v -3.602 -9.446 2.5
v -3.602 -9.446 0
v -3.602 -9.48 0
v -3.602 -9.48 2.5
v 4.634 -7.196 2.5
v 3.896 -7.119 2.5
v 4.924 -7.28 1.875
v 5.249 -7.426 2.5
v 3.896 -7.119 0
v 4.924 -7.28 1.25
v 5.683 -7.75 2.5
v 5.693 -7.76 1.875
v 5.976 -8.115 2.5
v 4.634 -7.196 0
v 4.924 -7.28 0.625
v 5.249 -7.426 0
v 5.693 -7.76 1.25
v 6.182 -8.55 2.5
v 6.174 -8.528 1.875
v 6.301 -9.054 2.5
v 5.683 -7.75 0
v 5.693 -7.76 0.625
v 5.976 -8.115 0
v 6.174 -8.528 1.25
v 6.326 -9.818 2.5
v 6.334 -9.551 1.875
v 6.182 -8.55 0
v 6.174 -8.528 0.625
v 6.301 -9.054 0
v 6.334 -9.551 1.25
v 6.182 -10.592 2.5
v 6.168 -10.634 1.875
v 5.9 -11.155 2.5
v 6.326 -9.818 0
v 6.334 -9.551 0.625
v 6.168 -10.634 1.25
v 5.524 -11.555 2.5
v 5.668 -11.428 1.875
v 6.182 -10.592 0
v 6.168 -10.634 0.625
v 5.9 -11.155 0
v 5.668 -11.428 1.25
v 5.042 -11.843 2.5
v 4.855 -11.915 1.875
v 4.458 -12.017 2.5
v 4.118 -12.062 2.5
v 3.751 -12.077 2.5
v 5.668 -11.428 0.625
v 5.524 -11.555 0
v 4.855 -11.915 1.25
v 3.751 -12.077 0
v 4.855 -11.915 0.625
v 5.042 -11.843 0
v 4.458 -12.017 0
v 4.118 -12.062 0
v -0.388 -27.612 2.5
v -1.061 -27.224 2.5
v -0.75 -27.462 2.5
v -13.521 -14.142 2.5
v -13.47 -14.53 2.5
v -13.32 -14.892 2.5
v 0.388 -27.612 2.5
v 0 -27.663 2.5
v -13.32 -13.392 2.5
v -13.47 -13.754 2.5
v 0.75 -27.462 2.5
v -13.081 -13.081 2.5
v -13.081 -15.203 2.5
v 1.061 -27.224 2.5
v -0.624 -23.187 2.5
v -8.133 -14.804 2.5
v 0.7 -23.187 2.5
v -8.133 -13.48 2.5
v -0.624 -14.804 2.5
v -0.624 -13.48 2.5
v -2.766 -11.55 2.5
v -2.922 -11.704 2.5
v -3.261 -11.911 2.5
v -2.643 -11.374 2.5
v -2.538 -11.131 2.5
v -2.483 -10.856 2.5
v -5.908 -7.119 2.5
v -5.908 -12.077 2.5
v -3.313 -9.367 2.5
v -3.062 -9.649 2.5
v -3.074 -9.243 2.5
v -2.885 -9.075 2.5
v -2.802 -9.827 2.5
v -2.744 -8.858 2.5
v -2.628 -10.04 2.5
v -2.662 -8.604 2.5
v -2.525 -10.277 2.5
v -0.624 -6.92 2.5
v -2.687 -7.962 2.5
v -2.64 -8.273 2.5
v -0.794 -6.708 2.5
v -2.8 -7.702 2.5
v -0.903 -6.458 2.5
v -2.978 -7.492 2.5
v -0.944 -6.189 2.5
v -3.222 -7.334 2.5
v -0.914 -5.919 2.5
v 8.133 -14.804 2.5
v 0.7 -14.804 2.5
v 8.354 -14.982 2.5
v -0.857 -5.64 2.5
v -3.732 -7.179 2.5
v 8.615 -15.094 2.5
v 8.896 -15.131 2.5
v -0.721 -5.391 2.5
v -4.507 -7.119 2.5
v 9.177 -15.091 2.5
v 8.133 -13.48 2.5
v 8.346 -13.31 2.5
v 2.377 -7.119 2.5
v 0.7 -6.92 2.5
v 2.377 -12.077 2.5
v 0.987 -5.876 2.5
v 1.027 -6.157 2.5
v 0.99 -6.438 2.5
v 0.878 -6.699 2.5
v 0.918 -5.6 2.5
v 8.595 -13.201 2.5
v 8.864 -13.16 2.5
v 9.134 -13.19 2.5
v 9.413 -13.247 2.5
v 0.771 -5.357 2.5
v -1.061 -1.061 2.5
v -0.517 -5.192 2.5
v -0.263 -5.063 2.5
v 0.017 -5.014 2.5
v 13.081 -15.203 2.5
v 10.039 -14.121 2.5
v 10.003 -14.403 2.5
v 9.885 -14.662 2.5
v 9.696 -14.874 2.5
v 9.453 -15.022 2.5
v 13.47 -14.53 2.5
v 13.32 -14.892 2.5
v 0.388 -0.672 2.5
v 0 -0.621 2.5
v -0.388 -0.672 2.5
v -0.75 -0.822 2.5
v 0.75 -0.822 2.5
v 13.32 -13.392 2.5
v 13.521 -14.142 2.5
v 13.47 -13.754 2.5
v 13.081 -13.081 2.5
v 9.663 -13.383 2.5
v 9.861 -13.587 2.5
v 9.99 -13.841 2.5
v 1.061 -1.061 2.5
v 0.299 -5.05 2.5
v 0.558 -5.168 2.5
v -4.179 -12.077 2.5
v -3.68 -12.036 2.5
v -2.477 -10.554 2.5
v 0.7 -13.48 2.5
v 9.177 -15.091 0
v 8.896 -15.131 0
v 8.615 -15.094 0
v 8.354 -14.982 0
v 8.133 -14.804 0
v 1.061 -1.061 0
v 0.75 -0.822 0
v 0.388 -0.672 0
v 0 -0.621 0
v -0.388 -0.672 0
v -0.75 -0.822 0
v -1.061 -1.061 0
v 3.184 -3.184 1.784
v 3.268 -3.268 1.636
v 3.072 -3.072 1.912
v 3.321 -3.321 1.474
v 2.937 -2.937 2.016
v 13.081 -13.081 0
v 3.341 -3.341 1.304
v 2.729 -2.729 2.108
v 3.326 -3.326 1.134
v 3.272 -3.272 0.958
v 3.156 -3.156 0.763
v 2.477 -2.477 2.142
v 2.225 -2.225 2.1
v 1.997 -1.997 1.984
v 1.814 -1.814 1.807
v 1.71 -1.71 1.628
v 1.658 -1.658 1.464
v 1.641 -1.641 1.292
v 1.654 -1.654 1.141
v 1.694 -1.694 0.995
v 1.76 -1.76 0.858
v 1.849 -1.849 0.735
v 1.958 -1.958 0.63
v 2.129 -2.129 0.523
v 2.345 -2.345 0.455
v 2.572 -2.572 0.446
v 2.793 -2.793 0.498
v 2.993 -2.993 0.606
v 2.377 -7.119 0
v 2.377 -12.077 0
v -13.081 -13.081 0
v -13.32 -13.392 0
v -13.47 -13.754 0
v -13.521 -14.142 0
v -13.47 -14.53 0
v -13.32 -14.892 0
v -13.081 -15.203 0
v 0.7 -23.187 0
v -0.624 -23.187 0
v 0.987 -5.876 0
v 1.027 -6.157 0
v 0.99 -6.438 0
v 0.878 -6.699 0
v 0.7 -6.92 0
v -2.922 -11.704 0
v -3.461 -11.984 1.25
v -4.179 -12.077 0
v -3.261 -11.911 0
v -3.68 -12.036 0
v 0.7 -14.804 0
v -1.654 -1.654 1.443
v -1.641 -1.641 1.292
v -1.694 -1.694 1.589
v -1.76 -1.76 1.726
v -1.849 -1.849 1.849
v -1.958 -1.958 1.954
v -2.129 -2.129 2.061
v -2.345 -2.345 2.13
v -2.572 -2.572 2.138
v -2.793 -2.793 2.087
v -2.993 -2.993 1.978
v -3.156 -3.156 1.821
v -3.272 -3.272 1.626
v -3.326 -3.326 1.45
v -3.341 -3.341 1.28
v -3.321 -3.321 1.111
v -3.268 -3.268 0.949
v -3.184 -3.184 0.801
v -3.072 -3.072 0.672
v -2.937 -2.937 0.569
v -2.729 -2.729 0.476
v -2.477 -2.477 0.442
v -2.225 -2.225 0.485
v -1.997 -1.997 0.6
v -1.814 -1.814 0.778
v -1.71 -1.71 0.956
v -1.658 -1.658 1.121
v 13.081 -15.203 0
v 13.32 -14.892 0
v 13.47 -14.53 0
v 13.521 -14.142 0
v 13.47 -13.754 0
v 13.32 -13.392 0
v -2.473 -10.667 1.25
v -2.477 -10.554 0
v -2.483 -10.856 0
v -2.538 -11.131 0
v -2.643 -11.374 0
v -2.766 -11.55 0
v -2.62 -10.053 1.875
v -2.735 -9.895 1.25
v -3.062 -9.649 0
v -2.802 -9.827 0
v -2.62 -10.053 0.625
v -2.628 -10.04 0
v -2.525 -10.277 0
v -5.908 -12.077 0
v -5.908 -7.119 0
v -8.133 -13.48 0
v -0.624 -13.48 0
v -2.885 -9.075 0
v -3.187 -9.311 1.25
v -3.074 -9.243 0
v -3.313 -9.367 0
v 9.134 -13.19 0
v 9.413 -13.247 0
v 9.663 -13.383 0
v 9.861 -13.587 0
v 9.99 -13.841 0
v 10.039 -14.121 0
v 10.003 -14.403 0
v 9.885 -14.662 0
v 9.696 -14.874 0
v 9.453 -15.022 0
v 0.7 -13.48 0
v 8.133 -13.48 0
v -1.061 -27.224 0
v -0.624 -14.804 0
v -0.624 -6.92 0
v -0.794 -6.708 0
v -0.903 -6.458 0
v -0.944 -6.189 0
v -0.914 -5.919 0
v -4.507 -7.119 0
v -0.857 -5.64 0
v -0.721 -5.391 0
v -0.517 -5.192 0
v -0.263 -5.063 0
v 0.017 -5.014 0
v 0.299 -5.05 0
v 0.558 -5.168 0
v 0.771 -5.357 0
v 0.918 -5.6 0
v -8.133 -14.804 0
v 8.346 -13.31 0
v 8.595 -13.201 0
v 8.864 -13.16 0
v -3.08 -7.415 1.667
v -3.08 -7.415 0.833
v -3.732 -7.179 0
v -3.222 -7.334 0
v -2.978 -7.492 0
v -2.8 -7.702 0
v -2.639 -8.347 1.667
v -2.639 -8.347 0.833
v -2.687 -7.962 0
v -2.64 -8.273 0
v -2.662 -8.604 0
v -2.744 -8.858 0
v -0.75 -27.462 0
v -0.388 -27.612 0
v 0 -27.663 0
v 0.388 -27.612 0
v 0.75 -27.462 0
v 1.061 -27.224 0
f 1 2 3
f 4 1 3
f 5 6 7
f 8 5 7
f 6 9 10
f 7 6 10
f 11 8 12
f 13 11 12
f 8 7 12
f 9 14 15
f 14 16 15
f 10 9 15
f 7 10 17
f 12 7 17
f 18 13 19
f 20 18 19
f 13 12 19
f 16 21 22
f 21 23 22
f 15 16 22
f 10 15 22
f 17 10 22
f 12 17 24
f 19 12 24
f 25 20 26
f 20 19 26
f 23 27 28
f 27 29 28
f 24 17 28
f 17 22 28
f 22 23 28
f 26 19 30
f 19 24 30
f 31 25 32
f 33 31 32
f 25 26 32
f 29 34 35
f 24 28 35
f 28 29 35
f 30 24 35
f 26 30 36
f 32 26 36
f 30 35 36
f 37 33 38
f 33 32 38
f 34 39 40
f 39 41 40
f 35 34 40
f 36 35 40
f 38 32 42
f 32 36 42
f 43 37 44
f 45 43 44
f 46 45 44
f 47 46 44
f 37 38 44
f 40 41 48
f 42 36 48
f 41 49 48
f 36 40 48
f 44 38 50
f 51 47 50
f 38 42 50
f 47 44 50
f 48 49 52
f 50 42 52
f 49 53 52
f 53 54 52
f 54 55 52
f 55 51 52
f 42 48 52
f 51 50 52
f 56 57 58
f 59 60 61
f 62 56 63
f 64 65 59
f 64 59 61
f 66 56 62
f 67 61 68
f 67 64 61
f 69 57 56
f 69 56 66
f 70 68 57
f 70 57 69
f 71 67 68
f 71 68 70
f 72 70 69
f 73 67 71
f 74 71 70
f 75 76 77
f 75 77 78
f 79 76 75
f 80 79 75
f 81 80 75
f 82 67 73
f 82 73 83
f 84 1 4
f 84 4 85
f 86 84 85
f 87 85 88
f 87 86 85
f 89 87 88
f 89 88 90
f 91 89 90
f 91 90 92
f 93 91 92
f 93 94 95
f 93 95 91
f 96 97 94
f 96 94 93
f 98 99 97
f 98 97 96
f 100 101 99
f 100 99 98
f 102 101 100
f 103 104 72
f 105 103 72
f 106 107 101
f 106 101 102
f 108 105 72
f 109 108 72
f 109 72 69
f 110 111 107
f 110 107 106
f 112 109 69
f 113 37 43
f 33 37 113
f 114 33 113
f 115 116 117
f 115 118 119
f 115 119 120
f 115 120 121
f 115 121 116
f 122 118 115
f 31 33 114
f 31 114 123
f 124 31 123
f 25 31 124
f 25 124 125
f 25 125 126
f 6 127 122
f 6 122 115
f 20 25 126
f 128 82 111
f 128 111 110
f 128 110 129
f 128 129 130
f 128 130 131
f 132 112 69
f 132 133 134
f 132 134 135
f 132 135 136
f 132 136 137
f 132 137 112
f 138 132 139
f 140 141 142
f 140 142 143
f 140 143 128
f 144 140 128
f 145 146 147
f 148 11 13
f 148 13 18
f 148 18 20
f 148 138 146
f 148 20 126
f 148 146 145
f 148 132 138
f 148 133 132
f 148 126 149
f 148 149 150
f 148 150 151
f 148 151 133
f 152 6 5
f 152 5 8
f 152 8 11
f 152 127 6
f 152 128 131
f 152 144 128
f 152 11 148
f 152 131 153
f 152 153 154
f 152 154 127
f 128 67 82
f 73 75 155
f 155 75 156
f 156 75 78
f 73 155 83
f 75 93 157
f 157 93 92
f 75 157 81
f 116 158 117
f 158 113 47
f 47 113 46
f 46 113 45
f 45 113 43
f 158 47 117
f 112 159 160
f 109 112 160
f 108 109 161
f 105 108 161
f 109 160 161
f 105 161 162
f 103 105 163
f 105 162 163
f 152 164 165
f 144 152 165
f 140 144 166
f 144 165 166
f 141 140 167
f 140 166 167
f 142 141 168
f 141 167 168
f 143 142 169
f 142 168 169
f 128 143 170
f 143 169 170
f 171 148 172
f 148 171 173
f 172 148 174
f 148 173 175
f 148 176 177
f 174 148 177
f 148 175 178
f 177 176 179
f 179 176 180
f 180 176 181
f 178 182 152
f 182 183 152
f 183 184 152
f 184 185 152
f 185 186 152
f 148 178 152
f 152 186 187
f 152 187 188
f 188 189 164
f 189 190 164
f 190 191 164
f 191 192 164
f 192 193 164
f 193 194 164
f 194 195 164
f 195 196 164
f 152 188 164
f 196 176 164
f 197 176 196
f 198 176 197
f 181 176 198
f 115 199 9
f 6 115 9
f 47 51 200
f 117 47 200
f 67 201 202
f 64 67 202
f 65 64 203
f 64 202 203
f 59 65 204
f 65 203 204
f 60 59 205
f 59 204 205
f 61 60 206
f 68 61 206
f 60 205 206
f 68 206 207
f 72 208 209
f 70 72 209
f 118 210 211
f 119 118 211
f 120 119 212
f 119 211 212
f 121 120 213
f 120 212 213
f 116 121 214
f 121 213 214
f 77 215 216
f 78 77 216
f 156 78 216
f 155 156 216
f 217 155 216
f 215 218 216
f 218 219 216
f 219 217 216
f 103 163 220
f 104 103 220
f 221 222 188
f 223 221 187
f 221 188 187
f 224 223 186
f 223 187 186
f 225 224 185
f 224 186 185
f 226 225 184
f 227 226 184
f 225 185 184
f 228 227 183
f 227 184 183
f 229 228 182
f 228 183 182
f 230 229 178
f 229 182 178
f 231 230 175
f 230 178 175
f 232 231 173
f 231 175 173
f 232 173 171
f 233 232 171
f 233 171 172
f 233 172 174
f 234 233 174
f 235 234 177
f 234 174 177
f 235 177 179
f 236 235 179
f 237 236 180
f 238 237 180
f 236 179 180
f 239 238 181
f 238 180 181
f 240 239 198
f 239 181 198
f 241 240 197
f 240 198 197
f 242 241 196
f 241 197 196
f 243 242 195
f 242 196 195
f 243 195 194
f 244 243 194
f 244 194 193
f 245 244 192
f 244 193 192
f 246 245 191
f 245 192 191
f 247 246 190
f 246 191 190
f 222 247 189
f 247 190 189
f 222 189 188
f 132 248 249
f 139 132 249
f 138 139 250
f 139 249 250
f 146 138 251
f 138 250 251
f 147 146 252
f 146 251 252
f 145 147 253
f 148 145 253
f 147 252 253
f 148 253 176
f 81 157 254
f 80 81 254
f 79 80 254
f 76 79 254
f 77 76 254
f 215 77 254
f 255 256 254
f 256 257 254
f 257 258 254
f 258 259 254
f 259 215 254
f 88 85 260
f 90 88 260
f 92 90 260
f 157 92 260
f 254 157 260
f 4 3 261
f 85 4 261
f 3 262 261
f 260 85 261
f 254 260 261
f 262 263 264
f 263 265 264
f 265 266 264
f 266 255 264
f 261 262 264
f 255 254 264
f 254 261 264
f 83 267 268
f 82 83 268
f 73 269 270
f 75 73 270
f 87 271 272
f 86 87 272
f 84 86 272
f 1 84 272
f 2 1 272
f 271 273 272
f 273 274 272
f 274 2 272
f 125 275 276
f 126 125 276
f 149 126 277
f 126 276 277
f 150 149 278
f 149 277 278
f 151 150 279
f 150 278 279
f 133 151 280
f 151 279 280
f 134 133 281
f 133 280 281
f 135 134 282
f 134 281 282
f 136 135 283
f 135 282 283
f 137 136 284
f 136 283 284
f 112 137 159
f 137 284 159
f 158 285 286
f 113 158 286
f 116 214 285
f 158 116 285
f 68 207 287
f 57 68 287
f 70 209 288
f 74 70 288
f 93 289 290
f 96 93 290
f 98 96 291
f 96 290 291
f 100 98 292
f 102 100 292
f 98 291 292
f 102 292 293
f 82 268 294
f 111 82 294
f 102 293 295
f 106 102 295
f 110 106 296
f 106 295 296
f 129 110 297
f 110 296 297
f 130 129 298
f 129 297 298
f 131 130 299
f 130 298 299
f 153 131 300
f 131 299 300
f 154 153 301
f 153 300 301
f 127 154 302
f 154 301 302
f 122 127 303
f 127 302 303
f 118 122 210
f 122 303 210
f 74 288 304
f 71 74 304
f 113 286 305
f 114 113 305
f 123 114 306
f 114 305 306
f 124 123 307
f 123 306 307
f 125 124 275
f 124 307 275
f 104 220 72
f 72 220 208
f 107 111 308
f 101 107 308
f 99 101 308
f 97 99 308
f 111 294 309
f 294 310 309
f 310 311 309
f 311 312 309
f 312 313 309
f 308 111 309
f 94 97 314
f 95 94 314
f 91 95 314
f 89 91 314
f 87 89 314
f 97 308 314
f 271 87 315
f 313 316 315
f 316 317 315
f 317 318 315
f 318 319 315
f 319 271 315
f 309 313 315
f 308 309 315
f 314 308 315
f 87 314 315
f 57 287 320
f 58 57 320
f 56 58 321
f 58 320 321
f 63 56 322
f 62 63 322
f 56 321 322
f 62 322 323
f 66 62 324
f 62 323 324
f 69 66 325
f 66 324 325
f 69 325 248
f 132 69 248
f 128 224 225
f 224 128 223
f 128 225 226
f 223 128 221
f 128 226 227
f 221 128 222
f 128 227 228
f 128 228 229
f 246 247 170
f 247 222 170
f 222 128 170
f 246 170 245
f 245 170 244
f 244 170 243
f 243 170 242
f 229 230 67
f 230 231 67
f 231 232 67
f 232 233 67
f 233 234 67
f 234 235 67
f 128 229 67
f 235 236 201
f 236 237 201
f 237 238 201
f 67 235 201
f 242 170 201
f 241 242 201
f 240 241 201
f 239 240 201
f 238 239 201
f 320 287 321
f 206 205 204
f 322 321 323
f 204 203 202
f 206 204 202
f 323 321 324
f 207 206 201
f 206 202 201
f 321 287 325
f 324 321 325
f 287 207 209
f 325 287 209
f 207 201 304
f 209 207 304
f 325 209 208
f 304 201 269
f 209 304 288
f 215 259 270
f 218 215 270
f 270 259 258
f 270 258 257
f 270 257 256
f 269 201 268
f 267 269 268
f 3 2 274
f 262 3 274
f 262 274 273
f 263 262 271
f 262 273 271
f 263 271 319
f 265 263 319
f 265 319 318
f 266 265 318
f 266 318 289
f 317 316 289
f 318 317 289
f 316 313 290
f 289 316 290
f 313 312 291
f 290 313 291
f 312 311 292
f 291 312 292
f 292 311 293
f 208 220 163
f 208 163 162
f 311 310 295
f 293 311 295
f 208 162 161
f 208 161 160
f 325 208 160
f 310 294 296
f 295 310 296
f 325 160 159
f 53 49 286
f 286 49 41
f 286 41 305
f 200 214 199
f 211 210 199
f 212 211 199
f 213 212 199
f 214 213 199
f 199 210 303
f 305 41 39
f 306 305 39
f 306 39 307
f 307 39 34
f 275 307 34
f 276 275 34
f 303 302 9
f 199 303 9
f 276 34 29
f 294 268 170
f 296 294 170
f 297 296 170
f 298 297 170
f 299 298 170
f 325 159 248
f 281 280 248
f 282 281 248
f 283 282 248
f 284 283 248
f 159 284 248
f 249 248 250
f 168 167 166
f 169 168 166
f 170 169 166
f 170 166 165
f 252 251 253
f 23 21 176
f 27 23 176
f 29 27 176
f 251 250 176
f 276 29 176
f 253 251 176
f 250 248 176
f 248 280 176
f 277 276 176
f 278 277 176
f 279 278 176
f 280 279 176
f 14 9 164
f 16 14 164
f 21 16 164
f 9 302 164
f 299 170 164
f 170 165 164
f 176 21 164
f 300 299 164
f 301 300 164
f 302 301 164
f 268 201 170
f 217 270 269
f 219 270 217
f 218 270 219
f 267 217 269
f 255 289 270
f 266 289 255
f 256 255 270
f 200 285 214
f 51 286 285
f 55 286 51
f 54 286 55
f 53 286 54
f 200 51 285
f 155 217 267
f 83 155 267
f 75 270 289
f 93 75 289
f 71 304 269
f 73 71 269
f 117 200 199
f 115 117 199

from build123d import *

# Parameters (mm, degrees)
F1_DEPTH = 2.5
F2_R     = 0.85
F3_DEPTH = 12.5


with BuildPart() as f1:
    # F0 (on Top) → F1 (new body)
    with BuildSketch(Plane.XY):
        with BuildLine():
            Line((13.081475452, -13.081475452), (1.0606601718, -1.0606601718))
            ThreePointArc((1.0606601718, -1.0606601718), (0, -0.6213203436), (-1.0606601718, -1.0606601718))
            Line((-1.0606601718, -1.0606601718), (-13.081475452, -13.081475452))
            ThreePointArc((-13.081475452, -13.081475452), (-13.5208152802, -14.1421356237), (-13.081475452, -15.2027957955))
            Line((-13.081475452, -15.2027957955), (-1.0606601718, -27.2236110757))
            ThreePointArc((-1.0606601718, -27.2236110757), (0, -27.6629509039), (1.0606601718, -27.2236110757))
            Line((1.0606601718, -27.2236110757), (13.081475452, -15.2027957955))
            ThreePointArc((13.081475452, -15.2027957955), (13.5208152802, -14.1421356237), (13.081475452, -13.081475452))
        make_face()
        with BuildLine():
            Line((-5.9082568333, -12.0771760074), (-5.9082568333, -7.1194937158))
            Line((-5.9082568333, -7.1194937158), (-4.5074321806, -7.1194937158))
            add(Edge.make_bspline(
                [(-4.5074321806, -7.1194937158), (-3.5211040556, -7.1194937158), (-3.0800233264, -7.4146326047)],
                knots=[0, 0, 0, 1, 1, 1], degree=2))
            add(Edge.make_bspline(
                [(-3.0800233264, -7.4146326047), (-2.6389425972, -7.7097714936), (-2.6389425972, -8.3467072574)],
                knots=[0, 0, 0, 1, 1, 1], degree=2))
            add(Edge.make_bspline(
                [(-2.6389425972, -8.3467072574), (-2.6389425972, -8.7883305213), (-2.8847108264, -9.0747888547)],
                knots=[0, 0, 0, 1, 1, 1], degree=2))
            add(Edge.make_bspline(
                [(-2.8847108264, -9.0747888547), (-3.1304790556, -9.361247188), (-3.6024842639, -9.4458826047)],
                knots=[0, 0, 0, 1, 1, 1], degree=2))
            Line((-3.6024842639, -9.4458826047), (-3.6024842639, -9.4795197574))
            add(Edge.make_bspline(
                [(-3.6024842639, -9.4795197574), (-2.4729269722, -9.6726621186), (-2.4729269722, -10.6665857297)],
                knots=[0, 0, 0, 1, 1, 1], degree=2))
            add(Edge.make_bspline(
                [(-2.4729269722, -10.6665857297), (-2.4729269722, -11.3306482297), (-2.9221457222, -11.7039121186)],
                knots=[0, 0, 0, 1, 1, 1], degree=2))
            add(Edge.make_bspline(
                [(-2.9221457222, -11.7039121186), (-3.3713644722, -12.0771760074), (-4.1786561389, -12.0771760074)],
                knots=[0, 0, 0, 1, 1, 1], degree=2))
            Line((-4.1786561389, -12.0771760074), (-5.9082568333, -12.0771760074))
        make_face(mode=Mode.SUBTRACT)
        with BuildLine():
            Line((-8.1334756687, -14.8039748892), (-8.1334756687, -13.4802963582))
            Line((-8.1334756687, -13.4802963582), (-0.6236797201, -13.4802963582))
            Line((-0.6236797201, -13.4802963582), (-0.6236797201, -6.9198086858))
            ThreePointArc((-0.6236797201, -6.9198086858), (-0.9032194318, -6.4583786209), (-0.9135835525, -5.9189782686))
            ThreePointArc((-0.9135835525, -5.9189782686), (0.0168397474, -5.0141534426), (0.9868078824, -5.876451129))
            ThreePointArc((0.9868078824, -5.876451129), (0.9900106564, -6.4384308628), (0.6999988109, -6.9198086858))
            Line((0.6999988109, -6.9198086858), (0.6999988109, -13.4802963582))
            Line((0.6999988109, -13.4802963582), (8.1334756687, -13.4802963582))
            ThreePointArc((8.1334756687, -13.4802963582), (8.5949057336, -13.2007566465), (9.134306086, -13.1903925258))
            ThreePointArc((9.134306086, -13.1903925258), (10.0391309119, -14.1208158258), (9.1768332255, -15.0907839607))
            ThreePointArc((9.1768332255, -15.0907839607), (8.6148534917, -15.0939867347), (8.1334756687, -14.8039748892))
            Line((8.1334756687, -14.8039748892), (0.6999988109, -14.8039748892))
            Line((0.6999988109, -14.8039748892), (0.6999988109, -23.1867600232))
            Line((0.6999988109, -23.1867600232), (-0.6236797201, -23.1867600232))
            Line((-0.6236797201, -23.1867600232), (-0.6236797201, -14.8039748892))
            Line((-0.6236797201, -14.8039748892), (-8.1334756687, -14.8039748892))
        make_face(mode=Mode.SUBTRACT)
        with BuildLine():
            add(Edge.make_bspline(
                [(5.6933566328, -7.7602282705), (6.3340901397, -8.4009617774), (6.3340901397, -9.5511353885)],
                knots=[0, 0, 0, 1, 1, 1], degree=2))
            add(Edge.make_bspline(
                [(6.3340901397, -9.5511353885), (6.3340901397, -10.7783489302), (5.6678575008, -11.4277629927)],
                knots=[0, 0, 0, 1, 1, 1], degree=2))
            add(Edge.make_bspline(
                [(5.6678575008, -11.4277629927), (5.0016248619, -12.0771770552), (3.7505397925, -12.0771770552)],
                knots=[0, 0, 0, 1, 1, 1], degree=2))
            Line((3.7505397925, -12.0771770552), (2.3768418758, -12.0771770552))
            Line((2.3768418758, -12.0771770552), (2.3768418758, -7.1194947635))
            Line((2.3768418758, -7.1194947635), (3.8959390981, -7.1194947635))
            add(Edge.make_bspline(
                [(3.8959390981, -7.1194947635), (5.0526231258, -7.1194947635), (5.6933566328, -7.7602282705)],
                knots=[0, 0, 0, 1, 1, 1], degree=2))
        make_face(mode=Mode.SUBTRACT)
    extrude(amount=F1_DEPTH)

    # F2 (on Right) → F3 (cut, symmetric)
    with BuildSketch(Plane.YZ):
        with Locations((-2.4908210296, 1.292226194)):
            Circle(F2_R)
    extrude(amount=F3_DEPTH, both=True, mode=Mode.SUBTRACT)


solid = f1.part
